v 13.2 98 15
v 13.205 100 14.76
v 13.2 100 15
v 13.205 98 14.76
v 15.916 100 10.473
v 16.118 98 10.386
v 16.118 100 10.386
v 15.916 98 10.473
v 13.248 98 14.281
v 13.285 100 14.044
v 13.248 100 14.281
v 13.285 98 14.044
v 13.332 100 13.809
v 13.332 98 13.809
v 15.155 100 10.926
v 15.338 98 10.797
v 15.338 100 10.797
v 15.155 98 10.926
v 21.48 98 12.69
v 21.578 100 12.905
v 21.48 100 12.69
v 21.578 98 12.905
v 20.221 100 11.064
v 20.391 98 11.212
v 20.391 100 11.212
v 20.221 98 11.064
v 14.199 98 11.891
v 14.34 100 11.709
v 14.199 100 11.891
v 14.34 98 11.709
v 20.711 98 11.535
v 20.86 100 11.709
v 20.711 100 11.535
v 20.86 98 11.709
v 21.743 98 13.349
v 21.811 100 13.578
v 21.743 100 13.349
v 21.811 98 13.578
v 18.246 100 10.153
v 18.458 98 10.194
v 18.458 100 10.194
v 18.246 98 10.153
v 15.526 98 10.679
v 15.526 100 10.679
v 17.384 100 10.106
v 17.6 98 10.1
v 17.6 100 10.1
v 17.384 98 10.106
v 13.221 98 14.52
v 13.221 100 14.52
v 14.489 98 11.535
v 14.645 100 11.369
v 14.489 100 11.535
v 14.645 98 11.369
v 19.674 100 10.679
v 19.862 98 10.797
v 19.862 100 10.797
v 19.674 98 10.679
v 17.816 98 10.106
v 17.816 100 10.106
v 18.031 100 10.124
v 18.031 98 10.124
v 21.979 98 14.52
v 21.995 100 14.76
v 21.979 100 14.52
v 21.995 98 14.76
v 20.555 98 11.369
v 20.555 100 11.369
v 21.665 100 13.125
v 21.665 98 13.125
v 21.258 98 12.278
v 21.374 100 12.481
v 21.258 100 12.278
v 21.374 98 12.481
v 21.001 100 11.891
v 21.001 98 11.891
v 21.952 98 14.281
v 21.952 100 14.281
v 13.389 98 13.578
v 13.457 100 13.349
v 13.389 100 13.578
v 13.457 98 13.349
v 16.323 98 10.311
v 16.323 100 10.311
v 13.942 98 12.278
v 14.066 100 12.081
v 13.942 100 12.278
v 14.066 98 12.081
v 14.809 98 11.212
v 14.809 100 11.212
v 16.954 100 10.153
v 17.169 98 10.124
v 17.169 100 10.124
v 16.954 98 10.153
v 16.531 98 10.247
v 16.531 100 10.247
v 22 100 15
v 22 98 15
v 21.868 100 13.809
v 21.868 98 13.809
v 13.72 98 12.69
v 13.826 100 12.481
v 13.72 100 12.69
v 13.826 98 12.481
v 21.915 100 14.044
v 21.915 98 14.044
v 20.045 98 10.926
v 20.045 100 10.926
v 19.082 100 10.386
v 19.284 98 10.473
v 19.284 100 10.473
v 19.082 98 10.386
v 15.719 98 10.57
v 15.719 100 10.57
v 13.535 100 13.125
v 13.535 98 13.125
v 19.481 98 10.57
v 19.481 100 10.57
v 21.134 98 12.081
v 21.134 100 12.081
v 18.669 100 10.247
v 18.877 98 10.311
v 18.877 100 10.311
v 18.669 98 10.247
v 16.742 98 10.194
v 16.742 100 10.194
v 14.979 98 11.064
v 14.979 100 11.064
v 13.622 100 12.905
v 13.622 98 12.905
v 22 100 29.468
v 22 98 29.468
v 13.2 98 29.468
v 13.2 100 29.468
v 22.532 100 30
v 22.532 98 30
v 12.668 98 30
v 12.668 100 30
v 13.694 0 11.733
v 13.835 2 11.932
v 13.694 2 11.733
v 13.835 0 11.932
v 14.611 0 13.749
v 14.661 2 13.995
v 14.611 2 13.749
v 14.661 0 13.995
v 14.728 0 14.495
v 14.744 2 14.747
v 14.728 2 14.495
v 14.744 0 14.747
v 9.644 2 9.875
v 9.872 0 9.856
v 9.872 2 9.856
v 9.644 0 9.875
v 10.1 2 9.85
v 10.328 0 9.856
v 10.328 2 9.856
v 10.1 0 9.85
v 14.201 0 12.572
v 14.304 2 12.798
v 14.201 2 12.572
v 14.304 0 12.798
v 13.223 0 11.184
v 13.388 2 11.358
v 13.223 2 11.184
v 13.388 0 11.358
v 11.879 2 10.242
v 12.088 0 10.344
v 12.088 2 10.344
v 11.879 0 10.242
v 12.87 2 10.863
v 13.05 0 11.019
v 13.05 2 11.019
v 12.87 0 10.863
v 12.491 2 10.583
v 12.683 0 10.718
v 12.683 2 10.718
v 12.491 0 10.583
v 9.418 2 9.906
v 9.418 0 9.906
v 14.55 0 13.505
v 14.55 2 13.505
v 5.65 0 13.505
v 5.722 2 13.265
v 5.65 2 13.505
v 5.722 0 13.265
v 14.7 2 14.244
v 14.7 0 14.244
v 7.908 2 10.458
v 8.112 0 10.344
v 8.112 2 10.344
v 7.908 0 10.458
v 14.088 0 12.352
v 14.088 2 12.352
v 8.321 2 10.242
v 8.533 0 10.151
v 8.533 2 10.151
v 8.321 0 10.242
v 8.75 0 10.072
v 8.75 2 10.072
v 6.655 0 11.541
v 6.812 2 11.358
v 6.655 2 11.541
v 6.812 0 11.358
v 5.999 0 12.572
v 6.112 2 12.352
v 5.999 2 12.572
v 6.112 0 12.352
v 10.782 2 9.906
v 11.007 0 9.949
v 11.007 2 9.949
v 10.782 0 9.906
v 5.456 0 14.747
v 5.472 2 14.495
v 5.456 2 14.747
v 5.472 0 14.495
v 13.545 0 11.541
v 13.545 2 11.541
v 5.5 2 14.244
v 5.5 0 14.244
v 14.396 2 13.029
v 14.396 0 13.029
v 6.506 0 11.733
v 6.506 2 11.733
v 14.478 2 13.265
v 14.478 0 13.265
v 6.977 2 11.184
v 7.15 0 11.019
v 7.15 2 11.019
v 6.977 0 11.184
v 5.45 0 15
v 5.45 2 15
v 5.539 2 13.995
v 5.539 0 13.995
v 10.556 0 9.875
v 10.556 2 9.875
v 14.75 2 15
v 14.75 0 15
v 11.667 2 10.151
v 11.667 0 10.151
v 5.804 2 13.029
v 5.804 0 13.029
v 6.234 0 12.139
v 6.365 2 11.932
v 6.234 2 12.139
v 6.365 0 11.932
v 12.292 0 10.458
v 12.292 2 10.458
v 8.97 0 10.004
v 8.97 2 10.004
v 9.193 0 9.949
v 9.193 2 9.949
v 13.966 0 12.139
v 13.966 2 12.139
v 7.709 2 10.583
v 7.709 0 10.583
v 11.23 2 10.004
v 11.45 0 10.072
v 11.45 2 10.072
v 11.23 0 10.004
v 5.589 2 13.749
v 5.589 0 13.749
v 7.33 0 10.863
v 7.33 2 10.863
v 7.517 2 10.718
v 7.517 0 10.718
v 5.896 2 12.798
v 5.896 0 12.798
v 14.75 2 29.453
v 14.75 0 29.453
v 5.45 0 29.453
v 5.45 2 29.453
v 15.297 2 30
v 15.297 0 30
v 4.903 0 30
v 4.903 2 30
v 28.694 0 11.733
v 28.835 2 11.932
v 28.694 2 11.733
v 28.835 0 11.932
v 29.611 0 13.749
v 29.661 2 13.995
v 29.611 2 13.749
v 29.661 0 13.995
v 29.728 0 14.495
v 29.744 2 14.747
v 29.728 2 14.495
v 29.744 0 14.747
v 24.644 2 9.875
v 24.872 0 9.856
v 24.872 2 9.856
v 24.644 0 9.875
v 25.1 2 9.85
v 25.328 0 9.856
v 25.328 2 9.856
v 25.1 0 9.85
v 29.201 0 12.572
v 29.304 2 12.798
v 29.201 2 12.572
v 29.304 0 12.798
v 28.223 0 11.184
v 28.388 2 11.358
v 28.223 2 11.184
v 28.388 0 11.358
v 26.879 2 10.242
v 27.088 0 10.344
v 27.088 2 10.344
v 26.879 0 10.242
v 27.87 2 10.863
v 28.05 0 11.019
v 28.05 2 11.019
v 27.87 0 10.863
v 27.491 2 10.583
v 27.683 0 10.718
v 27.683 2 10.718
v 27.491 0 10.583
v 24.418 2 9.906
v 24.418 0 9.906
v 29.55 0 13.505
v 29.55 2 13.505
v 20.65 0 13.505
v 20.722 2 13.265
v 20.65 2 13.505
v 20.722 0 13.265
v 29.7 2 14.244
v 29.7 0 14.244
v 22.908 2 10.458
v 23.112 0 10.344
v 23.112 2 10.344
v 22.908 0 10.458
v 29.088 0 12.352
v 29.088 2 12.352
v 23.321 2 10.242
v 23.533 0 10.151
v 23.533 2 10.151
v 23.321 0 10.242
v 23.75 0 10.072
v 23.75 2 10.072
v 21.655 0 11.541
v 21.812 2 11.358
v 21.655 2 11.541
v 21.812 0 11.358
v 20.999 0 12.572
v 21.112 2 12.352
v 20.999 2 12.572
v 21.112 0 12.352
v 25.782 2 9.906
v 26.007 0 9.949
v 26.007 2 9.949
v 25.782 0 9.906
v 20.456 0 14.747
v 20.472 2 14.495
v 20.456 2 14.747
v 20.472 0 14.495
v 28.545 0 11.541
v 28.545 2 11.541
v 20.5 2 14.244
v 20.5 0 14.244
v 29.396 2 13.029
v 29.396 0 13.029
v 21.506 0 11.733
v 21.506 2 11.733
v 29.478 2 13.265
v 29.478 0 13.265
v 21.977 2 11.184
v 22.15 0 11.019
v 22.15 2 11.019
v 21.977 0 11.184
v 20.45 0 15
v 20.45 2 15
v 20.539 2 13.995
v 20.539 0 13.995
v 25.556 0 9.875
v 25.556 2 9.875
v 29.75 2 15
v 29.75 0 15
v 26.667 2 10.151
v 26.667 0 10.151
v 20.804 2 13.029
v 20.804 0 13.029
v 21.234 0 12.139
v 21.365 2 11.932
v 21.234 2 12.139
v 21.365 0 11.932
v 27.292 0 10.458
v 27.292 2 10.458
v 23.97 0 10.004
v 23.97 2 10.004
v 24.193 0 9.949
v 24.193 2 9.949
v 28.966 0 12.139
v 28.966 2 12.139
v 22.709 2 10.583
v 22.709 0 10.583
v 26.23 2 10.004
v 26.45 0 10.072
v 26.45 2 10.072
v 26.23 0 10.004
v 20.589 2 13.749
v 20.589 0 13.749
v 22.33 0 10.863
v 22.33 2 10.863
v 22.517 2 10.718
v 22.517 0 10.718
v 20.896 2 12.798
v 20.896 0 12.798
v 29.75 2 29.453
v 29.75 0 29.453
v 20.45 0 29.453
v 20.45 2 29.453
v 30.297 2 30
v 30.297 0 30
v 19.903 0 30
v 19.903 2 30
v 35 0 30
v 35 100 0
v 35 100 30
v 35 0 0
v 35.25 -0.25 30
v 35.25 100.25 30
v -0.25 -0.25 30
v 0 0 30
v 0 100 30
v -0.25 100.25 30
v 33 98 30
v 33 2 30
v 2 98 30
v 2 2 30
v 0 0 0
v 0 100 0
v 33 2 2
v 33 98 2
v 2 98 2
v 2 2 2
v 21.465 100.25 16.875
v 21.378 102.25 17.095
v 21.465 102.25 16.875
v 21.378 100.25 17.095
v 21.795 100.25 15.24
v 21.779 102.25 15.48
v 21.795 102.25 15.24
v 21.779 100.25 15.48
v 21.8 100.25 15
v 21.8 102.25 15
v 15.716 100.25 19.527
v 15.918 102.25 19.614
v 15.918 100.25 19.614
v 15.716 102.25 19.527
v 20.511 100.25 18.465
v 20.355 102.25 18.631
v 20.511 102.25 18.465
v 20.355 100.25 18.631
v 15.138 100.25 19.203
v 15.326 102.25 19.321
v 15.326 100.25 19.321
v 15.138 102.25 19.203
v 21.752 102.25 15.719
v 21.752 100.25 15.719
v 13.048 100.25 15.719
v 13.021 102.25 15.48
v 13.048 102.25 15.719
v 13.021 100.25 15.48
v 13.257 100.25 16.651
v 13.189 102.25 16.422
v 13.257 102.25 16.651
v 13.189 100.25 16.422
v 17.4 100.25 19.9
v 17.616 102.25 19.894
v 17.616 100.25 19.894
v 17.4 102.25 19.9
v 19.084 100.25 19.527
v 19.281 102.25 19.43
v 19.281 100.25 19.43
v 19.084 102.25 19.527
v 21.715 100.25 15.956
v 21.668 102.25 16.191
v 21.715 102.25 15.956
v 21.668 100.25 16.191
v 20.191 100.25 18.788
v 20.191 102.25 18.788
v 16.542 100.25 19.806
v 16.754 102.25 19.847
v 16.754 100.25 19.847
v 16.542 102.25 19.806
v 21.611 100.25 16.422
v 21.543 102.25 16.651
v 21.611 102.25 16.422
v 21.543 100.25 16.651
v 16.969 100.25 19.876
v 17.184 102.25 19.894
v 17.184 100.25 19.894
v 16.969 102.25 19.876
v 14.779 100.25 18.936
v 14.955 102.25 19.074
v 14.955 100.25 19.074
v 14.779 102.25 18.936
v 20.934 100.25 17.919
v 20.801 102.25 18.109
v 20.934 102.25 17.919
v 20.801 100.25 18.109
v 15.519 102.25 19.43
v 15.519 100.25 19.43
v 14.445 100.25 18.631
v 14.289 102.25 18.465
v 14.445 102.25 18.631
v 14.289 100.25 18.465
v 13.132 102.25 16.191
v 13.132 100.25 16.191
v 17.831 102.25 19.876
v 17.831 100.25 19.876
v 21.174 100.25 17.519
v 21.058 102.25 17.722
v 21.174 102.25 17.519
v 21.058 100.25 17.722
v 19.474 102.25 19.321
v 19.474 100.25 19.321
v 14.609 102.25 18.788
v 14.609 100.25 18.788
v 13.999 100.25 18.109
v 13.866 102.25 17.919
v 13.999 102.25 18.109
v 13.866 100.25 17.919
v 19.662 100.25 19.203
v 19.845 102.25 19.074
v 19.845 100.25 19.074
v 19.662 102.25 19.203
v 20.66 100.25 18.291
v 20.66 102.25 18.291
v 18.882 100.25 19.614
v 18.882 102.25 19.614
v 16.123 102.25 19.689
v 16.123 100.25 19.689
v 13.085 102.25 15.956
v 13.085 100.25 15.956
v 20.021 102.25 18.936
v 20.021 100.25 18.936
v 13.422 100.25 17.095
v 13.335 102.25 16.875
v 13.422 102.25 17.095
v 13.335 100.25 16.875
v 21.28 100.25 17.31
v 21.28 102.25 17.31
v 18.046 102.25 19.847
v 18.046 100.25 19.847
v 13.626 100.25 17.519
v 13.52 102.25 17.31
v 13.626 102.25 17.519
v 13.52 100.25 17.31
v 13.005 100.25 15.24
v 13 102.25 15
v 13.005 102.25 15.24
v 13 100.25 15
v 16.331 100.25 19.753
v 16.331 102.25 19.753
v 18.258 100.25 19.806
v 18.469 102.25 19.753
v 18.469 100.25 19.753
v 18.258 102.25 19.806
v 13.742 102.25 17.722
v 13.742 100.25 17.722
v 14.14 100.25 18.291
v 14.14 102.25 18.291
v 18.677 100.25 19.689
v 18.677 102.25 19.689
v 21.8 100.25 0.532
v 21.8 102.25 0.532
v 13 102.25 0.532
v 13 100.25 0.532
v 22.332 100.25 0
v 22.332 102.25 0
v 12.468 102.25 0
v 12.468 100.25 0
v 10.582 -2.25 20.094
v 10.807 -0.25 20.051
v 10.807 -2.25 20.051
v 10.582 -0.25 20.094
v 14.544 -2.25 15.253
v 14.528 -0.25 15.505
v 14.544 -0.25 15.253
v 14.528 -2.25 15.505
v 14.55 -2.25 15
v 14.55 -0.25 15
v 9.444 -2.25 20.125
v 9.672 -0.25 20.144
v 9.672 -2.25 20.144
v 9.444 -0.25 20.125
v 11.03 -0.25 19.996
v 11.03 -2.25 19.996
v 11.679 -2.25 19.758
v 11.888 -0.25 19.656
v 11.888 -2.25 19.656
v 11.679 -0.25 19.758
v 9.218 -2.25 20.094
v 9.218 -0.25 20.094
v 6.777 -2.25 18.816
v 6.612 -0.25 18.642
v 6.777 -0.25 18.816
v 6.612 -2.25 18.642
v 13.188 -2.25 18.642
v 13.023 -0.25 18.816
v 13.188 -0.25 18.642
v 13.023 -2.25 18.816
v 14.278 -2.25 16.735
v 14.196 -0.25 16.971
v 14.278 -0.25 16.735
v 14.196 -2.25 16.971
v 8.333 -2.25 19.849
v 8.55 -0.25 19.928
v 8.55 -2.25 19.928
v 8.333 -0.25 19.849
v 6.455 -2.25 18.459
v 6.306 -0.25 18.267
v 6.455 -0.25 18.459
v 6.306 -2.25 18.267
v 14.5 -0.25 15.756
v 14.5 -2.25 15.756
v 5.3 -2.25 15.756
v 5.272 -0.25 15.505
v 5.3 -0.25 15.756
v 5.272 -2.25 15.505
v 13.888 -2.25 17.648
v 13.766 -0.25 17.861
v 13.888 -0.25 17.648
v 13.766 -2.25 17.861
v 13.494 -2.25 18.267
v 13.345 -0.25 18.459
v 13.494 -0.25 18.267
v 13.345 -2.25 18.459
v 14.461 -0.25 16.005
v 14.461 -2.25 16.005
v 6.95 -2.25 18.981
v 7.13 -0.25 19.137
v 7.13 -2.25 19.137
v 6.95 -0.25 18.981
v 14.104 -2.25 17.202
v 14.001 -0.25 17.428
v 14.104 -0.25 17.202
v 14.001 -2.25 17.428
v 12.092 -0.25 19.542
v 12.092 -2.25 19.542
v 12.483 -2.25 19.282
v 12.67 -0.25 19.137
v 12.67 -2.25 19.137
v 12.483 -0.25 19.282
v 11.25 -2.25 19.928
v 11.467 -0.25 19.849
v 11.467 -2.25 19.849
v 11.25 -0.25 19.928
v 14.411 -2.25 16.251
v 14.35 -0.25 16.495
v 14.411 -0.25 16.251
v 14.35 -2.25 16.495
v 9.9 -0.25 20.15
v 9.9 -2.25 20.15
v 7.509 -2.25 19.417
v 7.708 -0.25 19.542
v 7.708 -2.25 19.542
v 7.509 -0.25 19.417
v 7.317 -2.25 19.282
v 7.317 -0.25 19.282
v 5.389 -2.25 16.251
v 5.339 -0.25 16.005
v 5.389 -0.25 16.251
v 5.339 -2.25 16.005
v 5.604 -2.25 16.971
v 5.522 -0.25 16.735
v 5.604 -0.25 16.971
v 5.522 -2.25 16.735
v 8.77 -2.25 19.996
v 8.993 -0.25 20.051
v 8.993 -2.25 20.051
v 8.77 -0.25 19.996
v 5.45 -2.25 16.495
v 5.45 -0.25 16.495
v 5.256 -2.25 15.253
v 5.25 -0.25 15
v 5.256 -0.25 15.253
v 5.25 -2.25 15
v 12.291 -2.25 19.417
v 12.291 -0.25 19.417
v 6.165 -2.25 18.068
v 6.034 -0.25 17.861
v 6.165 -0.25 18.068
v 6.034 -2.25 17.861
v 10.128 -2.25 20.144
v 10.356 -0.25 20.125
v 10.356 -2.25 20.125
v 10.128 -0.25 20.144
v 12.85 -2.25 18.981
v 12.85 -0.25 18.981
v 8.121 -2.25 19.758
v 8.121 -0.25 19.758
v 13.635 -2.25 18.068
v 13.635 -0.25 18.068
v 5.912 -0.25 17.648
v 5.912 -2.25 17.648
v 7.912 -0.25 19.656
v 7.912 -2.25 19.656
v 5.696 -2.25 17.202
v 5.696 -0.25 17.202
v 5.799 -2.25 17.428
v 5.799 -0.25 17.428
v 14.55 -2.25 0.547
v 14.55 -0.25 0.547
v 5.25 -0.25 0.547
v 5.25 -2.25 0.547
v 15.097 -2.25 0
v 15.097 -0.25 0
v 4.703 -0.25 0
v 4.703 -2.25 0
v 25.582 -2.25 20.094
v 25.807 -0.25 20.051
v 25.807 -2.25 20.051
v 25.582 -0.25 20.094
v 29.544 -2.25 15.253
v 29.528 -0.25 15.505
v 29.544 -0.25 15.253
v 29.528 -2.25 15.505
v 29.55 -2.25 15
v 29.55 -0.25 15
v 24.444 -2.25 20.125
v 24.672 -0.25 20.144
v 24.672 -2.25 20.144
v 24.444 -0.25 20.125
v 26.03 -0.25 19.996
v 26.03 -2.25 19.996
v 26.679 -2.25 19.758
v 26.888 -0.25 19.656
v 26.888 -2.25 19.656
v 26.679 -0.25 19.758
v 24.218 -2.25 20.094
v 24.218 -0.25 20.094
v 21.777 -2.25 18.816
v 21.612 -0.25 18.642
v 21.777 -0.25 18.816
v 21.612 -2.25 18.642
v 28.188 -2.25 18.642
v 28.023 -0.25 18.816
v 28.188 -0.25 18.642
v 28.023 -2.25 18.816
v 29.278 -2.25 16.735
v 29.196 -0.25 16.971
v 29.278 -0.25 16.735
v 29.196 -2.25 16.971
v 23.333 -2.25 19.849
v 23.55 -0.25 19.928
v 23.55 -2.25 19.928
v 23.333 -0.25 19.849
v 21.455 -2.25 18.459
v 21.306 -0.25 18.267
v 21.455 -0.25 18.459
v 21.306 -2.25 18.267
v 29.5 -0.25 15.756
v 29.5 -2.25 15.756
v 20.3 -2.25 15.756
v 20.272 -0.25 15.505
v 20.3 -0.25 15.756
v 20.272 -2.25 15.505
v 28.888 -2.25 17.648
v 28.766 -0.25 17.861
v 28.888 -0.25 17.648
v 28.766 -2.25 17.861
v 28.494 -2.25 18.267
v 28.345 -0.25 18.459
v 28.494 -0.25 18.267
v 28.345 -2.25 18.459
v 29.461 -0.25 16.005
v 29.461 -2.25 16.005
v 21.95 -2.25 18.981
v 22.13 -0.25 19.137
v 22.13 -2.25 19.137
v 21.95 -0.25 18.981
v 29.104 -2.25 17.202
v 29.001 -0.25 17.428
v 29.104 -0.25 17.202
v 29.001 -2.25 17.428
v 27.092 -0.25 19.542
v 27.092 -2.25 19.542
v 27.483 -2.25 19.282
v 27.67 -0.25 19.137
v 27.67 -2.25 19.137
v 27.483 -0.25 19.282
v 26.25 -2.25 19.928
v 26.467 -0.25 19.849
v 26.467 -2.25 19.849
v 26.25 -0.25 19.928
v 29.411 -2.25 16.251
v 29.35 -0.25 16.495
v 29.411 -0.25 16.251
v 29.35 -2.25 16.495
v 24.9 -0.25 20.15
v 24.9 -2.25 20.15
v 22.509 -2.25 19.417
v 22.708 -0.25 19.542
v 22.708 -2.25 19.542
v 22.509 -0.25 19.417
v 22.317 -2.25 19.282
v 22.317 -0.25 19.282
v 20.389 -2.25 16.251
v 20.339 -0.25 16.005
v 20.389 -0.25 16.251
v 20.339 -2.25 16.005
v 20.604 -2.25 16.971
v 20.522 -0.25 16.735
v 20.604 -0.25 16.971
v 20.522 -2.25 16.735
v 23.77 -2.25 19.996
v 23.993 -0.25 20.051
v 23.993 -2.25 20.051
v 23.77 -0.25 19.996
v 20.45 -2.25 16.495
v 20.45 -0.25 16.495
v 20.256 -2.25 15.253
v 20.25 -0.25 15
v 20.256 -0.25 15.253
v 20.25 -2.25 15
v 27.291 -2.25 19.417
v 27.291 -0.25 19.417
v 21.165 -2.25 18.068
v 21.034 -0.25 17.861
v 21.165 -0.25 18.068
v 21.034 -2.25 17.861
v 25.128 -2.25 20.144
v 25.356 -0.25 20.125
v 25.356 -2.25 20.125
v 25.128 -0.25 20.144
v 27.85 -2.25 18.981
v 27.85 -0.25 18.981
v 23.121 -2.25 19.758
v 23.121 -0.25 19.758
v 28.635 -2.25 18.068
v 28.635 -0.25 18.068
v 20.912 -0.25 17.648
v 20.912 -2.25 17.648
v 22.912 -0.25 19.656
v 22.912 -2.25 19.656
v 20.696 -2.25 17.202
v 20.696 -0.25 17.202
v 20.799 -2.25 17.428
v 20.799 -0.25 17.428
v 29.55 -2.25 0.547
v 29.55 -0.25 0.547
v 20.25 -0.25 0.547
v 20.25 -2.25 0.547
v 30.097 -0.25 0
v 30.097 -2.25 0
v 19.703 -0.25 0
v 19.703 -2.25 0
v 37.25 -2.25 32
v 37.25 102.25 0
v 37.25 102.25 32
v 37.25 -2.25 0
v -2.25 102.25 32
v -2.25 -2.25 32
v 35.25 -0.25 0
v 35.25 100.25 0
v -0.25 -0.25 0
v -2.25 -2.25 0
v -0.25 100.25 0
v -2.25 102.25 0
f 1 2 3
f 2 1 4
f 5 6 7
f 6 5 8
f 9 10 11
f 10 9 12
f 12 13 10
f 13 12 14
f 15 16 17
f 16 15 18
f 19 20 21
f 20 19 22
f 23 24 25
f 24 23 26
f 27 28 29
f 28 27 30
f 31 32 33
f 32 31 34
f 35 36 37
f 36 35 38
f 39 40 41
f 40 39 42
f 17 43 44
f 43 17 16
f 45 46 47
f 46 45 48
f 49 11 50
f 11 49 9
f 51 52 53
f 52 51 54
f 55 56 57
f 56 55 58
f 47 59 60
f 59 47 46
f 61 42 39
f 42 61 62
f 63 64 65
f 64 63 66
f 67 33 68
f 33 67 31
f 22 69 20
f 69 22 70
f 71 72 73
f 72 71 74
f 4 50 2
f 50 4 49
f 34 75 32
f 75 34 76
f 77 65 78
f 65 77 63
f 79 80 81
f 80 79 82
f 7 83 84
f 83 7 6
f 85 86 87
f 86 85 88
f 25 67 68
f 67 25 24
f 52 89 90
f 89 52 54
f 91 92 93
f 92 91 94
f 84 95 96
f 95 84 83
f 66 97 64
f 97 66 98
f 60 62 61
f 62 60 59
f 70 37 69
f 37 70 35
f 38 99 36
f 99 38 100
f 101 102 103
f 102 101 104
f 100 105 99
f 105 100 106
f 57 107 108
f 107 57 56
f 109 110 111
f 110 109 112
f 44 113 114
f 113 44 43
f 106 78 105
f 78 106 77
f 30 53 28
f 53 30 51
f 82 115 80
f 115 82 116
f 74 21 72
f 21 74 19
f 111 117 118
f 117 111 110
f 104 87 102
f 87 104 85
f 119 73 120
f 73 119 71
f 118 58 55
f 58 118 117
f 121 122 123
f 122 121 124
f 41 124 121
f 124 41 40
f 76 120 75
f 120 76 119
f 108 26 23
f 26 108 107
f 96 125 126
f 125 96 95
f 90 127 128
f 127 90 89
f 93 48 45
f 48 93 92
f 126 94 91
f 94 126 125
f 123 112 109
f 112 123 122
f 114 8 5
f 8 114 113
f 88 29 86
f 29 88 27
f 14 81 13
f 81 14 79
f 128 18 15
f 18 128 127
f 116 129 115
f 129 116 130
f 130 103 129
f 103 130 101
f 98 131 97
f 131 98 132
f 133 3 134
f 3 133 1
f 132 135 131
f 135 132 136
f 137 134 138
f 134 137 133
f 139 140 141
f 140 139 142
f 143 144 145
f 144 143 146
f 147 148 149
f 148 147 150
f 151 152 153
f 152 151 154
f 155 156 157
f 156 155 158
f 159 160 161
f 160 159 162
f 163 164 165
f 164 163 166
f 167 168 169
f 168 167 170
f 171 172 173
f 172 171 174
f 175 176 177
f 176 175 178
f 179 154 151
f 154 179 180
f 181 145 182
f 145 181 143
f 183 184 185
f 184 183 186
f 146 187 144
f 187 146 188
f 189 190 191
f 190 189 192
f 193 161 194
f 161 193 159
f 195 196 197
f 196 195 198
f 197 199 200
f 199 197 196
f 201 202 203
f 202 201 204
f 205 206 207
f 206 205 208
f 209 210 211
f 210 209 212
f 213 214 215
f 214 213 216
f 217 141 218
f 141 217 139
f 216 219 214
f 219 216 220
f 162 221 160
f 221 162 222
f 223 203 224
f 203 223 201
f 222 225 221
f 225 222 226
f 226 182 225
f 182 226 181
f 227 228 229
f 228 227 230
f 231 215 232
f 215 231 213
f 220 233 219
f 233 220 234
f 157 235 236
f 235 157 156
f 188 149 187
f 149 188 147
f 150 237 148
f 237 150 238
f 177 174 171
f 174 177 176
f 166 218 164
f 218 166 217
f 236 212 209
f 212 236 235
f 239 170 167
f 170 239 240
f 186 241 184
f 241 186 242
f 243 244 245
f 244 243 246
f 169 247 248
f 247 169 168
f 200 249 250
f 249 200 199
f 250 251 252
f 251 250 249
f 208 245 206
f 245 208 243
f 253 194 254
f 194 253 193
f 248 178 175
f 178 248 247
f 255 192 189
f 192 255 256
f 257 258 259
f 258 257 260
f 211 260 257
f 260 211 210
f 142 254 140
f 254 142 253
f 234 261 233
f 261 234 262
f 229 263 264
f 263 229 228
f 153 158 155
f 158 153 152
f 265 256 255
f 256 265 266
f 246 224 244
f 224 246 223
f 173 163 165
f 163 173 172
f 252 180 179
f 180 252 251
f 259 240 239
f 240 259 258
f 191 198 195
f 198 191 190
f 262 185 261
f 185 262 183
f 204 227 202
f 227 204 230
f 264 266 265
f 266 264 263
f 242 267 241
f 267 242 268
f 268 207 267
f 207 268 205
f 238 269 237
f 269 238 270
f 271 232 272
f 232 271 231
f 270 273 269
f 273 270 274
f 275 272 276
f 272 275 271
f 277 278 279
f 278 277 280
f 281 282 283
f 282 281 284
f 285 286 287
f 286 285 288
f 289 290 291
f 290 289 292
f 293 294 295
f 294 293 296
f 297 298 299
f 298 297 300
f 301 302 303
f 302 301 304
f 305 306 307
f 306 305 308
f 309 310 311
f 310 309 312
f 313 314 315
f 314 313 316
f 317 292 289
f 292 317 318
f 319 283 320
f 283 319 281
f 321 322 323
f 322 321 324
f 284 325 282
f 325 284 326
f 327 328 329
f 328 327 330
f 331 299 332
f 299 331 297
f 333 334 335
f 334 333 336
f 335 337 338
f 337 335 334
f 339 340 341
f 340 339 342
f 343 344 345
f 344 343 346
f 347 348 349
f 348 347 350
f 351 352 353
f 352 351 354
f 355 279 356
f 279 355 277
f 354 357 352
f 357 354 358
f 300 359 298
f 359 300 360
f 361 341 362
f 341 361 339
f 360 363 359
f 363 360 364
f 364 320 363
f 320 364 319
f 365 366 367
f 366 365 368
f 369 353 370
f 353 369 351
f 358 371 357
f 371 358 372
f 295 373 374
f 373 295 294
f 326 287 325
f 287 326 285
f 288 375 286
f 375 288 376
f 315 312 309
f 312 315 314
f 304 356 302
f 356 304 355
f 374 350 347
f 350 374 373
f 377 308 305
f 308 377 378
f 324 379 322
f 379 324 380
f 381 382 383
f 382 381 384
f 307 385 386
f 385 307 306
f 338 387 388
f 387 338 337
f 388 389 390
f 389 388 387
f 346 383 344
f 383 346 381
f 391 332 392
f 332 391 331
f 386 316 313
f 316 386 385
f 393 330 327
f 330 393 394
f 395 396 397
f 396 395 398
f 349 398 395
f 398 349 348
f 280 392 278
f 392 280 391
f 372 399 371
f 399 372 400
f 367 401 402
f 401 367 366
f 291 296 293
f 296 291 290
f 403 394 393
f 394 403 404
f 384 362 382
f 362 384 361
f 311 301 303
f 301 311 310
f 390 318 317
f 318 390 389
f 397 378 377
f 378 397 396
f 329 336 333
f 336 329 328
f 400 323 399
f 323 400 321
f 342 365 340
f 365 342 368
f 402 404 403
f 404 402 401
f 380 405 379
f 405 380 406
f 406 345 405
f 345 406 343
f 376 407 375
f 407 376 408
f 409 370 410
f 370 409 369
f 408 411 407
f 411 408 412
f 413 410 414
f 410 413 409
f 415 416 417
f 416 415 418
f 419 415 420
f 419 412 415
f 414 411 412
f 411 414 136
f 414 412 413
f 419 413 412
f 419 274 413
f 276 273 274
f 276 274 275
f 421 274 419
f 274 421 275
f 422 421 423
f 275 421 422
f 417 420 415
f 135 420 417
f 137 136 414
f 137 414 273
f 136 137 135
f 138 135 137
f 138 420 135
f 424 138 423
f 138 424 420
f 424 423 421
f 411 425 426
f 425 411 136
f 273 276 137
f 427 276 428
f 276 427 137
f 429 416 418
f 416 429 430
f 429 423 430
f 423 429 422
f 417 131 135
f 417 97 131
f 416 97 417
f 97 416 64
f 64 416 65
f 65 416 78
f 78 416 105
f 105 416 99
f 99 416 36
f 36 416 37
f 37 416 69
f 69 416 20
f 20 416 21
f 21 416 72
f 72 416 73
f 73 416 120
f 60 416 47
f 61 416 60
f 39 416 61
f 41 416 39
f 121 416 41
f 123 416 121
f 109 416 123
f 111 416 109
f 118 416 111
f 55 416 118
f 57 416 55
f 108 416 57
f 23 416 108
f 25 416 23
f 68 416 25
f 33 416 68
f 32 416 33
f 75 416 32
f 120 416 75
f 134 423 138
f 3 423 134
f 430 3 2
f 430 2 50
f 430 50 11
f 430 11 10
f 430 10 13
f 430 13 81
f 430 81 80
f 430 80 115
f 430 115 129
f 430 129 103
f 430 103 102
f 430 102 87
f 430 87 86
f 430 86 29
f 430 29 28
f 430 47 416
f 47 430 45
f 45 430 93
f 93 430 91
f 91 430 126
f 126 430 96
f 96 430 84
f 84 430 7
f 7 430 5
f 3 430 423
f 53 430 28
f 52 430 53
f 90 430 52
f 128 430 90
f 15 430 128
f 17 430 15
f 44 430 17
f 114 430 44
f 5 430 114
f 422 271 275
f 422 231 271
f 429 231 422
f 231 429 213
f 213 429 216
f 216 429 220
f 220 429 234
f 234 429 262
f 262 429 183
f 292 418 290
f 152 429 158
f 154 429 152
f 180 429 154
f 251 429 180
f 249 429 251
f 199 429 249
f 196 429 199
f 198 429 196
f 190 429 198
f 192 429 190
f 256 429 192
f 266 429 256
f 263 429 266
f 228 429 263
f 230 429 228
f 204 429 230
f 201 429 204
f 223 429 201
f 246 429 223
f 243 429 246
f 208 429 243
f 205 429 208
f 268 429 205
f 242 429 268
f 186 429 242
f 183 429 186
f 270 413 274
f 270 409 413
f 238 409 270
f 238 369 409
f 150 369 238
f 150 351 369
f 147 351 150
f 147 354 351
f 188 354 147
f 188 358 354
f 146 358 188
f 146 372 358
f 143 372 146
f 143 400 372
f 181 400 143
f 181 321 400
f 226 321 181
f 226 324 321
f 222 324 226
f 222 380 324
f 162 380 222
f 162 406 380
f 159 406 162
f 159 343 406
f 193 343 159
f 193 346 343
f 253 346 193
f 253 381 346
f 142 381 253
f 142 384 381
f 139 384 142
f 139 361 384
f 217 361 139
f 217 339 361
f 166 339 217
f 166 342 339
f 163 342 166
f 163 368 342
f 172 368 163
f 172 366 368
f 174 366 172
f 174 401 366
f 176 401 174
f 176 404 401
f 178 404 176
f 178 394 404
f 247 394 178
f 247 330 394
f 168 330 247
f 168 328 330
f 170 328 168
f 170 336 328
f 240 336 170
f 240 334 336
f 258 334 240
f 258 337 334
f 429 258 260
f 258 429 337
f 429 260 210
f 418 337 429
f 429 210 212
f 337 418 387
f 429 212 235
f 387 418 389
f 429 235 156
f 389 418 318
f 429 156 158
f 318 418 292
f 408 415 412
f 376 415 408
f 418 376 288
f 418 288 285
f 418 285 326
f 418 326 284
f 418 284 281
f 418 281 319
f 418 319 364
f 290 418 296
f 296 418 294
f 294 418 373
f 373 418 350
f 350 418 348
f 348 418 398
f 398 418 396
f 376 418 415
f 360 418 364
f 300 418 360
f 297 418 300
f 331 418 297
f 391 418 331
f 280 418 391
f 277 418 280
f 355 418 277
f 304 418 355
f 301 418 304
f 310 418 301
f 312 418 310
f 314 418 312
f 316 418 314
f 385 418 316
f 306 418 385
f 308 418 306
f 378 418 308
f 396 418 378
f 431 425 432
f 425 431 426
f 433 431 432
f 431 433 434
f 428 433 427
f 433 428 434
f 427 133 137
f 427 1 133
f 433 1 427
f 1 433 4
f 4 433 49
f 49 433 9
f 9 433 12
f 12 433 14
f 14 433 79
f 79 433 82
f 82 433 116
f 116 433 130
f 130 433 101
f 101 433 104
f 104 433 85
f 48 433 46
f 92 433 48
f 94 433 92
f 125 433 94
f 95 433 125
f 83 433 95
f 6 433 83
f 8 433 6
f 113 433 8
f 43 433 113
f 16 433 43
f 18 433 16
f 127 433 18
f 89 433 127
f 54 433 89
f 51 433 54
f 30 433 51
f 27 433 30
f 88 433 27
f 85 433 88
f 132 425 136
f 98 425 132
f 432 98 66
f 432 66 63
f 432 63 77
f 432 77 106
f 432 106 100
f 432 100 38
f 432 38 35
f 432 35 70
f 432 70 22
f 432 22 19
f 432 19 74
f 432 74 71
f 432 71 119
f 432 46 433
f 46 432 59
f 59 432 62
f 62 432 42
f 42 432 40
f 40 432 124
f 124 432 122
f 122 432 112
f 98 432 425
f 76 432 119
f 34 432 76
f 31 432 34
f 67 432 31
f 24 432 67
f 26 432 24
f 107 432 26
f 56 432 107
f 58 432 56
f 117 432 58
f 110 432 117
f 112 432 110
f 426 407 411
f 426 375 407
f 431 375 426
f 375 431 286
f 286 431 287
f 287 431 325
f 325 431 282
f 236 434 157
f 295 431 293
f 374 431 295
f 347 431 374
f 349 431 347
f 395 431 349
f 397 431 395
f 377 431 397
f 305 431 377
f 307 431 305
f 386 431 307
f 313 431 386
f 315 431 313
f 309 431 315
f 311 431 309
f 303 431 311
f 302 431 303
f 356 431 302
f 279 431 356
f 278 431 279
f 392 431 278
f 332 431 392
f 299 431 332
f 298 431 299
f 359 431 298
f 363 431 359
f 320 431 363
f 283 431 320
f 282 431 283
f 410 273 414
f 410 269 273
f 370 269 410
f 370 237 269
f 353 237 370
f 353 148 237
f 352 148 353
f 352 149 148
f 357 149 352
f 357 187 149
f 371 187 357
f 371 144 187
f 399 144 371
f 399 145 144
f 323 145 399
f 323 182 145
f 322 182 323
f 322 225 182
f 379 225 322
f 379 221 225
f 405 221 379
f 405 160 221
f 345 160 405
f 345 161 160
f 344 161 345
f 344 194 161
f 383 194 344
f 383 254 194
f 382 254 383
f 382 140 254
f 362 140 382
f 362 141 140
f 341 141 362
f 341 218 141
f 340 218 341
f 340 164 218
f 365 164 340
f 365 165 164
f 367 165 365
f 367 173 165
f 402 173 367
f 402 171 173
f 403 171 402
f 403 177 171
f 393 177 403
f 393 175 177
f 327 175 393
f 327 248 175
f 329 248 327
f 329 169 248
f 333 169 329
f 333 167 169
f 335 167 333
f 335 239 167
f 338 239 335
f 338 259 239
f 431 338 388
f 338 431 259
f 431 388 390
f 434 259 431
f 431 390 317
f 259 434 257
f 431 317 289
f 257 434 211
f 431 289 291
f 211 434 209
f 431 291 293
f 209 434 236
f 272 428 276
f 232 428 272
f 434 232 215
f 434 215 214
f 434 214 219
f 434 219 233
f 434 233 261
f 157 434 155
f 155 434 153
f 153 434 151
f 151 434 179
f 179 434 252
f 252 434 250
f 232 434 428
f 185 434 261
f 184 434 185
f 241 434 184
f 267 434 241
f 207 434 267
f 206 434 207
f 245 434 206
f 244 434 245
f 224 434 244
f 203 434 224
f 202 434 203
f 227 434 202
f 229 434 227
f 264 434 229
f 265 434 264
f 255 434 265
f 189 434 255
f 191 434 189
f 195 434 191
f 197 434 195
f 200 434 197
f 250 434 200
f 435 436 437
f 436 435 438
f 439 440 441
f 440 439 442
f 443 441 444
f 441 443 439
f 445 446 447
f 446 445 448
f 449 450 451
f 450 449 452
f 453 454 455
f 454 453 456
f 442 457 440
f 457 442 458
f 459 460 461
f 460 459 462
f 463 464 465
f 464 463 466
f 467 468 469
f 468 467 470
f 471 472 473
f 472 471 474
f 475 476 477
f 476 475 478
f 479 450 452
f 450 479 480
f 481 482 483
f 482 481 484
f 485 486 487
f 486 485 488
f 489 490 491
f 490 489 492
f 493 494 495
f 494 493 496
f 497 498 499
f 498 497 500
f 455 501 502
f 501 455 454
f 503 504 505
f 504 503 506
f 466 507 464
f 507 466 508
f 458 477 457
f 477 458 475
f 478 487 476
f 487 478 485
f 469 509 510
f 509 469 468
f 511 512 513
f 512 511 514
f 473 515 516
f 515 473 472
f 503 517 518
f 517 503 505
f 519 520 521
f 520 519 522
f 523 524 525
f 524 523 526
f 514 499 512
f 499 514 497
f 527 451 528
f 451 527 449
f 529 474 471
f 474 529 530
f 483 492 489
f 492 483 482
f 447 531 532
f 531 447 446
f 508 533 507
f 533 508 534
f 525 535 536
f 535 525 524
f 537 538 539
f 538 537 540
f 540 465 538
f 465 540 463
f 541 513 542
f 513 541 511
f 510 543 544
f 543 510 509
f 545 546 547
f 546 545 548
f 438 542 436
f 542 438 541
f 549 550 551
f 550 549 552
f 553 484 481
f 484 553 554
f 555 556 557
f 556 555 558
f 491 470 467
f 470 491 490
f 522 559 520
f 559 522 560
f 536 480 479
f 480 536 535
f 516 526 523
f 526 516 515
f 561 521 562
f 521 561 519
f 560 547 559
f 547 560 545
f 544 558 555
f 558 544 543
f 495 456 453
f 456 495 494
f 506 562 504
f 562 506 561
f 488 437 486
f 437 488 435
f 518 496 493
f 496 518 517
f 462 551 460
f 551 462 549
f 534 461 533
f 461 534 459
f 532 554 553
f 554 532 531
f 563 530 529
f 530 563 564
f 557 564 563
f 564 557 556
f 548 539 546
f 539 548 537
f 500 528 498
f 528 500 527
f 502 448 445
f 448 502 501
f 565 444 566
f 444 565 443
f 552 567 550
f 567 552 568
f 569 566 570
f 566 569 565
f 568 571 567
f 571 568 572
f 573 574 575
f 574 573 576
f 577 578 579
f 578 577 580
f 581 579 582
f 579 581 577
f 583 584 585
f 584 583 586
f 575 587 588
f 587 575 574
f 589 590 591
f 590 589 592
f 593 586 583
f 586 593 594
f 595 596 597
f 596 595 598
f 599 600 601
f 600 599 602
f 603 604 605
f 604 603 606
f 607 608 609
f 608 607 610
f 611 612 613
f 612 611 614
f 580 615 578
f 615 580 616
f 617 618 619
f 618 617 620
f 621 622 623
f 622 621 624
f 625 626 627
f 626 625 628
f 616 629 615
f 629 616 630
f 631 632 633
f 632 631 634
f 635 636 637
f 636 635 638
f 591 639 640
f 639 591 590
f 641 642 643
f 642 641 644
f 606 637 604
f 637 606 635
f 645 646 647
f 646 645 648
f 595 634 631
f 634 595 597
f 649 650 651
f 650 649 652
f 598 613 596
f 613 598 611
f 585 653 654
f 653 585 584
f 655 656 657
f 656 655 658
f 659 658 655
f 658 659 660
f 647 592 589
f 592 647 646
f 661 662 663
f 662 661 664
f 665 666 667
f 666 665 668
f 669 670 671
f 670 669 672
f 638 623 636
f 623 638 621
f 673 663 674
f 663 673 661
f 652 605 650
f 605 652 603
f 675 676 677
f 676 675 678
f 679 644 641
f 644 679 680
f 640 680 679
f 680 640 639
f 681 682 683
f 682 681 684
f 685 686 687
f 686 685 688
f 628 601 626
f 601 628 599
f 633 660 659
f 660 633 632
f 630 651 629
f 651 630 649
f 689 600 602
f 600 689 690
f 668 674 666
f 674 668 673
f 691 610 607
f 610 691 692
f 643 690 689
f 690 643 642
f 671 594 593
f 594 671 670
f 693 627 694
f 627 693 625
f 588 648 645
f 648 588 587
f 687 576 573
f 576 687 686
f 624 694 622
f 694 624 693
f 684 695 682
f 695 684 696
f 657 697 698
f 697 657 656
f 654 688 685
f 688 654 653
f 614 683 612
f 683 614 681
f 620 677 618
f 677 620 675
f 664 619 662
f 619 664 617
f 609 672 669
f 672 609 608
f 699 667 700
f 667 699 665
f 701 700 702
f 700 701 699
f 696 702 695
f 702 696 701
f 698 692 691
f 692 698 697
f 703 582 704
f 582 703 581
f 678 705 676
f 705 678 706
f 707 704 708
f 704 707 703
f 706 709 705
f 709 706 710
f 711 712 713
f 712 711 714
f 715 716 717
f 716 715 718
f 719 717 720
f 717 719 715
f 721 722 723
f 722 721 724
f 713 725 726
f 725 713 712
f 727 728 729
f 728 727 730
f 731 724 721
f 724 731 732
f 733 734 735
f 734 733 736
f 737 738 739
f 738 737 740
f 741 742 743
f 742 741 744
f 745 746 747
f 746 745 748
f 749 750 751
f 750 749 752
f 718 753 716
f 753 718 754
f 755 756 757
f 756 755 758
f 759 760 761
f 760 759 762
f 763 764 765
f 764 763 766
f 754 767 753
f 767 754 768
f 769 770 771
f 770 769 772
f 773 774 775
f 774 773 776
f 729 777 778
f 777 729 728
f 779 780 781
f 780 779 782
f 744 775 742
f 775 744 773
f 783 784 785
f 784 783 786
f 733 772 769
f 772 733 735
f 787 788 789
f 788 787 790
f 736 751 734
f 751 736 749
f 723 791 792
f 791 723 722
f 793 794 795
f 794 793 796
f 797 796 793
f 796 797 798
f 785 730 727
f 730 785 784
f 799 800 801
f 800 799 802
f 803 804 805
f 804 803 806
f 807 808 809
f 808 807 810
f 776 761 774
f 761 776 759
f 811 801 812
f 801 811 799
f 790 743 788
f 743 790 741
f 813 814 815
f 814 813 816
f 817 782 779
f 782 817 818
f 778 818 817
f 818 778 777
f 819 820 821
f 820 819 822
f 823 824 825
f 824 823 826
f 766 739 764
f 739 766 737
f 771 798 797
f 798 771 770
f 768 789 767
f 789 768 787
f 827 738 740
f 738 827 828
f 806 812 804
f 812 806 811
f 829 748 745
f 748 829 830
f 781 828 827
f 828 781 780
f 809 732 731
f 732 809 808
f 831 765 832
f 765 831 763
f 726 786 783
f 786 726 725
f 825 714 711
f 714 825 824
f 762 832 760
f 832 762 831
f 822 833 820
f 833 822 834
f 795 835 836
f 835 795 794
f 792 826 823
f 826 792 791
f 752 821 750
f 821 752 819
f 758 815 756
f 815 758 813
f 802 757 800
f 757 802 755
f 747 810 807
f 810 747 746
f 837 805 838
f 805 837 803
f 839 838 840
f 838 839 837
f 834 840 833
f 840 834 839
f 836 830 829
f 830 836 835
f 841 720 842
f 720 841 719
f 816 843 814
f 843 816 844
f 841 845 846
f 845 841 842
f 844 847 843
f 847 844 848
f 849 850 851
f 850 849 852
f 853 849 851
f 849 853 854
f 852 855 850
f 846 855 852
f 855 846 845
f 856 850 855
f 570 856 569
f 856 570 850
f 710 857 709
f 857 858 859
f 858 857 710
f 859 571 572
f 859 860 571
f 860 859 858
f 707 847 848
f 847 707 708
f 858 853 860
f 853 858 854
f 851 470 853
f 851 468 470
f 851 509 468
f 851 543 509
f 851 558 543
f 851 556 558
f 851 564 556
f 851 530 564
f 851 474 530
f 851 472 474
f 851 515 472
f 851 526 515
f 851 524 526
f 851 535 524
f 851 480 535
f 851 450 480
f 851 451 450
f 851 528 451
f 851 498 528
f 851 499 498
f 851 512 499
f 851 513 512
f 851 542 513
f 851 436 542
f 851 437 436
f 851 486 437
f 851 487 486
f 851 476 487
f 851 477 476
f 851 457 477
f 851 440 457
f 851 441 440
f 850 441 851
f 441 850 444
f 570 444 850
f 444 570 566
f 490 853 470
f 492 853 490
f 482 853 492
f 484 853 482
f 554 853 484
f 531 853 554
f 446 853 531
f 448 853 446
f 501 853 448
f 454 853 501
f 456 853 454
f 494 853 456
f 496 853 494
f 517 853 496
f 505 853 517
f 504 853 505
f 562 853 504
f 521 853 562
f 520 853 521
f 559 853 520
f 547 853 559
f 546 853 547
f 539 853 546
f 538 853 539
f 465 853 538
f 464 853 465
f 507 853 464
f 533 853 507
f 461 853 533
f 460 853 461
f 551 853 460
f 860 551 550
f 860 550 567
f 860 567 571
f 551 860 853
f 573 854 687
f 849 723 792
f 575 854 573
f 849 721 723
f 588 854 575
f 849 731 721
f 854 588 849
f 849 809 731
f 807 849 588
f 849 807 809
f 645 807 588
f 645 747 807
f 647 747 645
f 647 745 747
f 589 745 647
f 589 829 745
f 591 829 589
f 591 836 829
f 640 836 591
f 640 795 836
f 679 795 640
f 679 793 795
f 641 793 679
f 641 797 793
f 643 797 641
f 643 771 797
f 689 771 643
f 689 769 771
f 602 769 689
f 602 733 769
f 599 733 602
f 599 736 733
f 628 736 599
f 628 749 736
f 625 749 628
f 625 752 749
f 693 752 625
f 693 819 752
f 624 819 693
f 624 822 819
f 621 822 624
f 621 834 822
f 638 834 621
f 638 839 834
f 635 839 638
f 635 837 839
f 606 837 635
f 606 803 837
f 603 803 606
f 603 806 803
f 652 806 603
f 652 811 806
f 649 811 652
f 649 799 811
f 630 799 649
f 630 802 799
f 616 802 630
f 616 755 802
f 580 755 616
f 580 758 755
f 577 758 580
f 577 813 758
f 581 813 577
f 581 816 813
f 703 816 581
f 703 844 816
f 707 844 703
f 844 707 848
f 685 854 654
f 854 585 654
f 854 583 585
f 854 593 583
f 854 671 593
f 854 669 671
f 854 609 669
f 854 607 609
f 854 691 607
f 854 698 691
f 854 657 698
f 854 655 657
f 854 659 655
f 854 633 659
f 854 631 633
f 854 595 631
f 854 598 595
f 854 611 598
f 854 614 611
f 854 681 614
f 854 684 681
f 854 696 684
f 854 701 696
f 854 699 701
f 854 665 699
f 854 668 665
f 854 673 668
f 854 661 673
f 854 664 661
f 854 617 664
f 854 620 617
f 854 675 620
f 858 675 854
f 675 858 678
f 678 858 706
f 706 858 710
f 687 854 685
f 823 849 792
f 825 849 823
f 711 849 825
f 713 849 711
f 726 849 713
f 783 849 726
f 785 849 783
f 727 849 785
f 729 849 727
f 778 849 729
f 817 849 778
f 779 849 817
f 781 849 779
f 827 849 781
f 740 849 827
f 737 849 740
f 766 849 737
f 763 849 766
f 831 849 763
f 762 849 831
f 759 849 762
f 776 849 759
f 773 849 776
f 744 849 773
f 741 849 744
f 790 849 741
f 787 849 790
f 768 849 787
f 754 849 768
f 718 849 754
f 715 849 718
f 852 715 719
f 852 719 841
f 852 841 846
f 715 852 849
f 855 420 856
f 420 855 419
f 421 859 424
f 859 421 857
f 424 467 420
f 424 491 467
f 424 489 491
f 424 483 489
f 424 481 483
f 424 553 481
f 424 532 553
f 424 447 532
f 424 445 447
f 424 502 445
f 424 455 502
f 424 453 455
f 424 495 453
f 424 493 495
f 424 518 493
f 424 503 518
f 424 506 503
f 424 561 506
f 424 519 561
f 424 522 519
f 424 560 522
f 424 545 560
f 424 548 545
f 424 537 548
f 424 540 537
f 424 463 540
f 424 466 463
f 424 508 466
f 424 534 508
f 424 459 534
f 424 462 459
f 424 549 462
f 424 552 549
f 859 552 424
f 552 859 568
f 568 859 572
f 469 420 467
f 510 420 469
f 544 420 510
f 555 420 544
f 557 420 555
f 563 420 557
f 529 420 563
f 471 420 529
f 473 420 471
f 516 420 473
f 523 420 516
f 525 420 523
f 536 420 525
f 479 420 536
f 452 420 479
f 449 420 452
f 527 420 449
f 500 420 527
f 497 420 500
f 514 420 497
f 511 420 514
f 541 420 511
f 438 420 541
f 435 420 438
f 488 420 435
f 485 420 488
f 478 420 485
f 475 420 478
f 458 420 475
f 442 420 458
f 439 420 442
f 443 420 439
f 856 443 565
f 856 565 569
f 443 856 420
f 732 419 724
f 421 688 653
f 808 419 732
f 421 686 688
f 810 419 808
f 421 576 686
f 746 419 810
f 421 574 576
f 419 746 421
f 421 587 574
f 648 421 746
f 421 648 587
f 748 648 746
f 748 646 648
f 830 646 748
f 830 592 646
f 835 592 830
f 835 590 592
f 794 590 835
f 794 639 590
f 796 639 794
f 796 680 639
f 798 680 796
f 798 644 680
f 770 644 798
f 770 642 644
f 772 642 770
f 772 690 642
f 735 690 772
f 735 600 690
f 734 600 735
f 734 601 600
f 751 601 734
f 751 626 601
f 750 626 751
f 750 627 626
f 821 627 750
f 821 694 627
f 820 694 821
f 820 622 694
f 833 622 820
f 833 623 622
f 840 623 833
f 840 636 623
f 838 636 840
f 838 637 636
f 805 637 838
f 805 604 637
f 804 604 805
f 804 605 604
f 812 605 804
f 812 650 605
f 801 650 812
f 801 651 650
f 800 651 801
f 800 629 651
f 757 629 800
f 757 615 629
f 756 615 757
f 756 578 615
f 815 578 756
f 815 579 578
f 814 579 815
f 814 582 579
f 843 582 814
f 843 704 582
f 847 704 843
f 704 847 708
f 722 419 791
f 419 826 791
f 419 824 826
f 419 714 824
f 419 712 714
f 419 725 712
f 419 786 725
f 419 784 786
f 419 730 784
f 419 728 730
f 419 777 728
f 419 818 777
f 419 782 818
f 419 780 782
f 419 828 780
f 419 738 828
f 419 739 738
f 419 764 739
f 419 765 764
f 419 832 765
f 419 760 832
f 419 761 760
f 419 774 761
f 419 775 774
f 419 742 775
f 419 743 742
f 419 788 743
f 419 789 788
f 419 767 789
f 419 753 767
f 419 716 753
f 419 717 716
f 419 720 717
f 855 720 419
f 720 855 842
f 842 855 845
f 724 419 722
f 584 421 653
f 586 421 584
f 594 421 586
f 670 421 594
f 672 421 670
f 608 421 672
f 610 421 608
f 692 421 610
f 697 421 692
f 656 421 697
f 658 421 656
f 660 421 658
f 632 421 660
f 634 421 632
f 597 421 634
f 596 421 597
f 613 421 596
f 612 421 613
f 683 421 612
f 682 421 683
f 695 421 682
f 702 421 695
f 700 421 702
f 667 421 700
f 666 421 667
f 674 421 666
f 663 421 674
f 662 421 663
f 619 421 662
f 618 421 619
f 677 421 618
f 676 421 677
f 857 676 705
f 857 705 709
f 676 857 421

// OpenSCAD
$fn = 128;

sizeX = 35;
sizeY = 100;
sizeZ = 30;


module cutout(size, delta, side) {
    // hole
    rotate([90, 0, 0])
    scale([(size-delta)/size, (size+delta)/size, 1])
    cylinder(10, d=size, center=true);

    // cutout
    translate([0, 0, sizeZ*side])
    cube([size-delta, 10, 2*sizeZ], center=true);

    // chamfer
    translate([0, 0, sizeZ*0.5*side])
    rotate([0, 45, 0])
    cube([size*0.75, 10, size*0.75], center=true);
}

module cables(side) {
    // one cable at upper side
    translate([17.5, sizeY, 15]) {
        cutout(9.3, 0.5, side);
    }

    // two cables at lower side
    for (i = [10, 25]) {
        translate([i, 0, 15]) {
            cutout(9.8, 0.5, side);
        }
    }

}


module lower() {
    difference() {
        // box
        cube([sizeX, sizeY, sizeZ]);

        // make hollow
        translate([2, 2, 2])
        cube([sizeX - 4, sizeY - 4, sizeZ]);  

        // cable cutouts shifted by 0.1mm
        translate([0.1, 0, 0])
        cables(1);
    }
}

module upper() {
    difference() {
        // box
        translate([-2.25, -2.25, 0])
        cube([sizeX + 4.5, sizeY + 4.5, sizeZ + 2]);

        // make hollow
        translate([-0.25, -0.25, -2])
        cube([sizeX + 0.5, sizeY + 0.5, sizeZ + 2]);
        
        // cable cutouts shifted by 0.1mm
        translate([-0.1, 0, 0])
        cables(-1);
    }
}


/*
difference() {
    union() {
        lower();
        //translate([0, 0, 1])
        upper();
    }
    
    cube([80, 80, 80], center=true);
}*/


lower();
upper();
